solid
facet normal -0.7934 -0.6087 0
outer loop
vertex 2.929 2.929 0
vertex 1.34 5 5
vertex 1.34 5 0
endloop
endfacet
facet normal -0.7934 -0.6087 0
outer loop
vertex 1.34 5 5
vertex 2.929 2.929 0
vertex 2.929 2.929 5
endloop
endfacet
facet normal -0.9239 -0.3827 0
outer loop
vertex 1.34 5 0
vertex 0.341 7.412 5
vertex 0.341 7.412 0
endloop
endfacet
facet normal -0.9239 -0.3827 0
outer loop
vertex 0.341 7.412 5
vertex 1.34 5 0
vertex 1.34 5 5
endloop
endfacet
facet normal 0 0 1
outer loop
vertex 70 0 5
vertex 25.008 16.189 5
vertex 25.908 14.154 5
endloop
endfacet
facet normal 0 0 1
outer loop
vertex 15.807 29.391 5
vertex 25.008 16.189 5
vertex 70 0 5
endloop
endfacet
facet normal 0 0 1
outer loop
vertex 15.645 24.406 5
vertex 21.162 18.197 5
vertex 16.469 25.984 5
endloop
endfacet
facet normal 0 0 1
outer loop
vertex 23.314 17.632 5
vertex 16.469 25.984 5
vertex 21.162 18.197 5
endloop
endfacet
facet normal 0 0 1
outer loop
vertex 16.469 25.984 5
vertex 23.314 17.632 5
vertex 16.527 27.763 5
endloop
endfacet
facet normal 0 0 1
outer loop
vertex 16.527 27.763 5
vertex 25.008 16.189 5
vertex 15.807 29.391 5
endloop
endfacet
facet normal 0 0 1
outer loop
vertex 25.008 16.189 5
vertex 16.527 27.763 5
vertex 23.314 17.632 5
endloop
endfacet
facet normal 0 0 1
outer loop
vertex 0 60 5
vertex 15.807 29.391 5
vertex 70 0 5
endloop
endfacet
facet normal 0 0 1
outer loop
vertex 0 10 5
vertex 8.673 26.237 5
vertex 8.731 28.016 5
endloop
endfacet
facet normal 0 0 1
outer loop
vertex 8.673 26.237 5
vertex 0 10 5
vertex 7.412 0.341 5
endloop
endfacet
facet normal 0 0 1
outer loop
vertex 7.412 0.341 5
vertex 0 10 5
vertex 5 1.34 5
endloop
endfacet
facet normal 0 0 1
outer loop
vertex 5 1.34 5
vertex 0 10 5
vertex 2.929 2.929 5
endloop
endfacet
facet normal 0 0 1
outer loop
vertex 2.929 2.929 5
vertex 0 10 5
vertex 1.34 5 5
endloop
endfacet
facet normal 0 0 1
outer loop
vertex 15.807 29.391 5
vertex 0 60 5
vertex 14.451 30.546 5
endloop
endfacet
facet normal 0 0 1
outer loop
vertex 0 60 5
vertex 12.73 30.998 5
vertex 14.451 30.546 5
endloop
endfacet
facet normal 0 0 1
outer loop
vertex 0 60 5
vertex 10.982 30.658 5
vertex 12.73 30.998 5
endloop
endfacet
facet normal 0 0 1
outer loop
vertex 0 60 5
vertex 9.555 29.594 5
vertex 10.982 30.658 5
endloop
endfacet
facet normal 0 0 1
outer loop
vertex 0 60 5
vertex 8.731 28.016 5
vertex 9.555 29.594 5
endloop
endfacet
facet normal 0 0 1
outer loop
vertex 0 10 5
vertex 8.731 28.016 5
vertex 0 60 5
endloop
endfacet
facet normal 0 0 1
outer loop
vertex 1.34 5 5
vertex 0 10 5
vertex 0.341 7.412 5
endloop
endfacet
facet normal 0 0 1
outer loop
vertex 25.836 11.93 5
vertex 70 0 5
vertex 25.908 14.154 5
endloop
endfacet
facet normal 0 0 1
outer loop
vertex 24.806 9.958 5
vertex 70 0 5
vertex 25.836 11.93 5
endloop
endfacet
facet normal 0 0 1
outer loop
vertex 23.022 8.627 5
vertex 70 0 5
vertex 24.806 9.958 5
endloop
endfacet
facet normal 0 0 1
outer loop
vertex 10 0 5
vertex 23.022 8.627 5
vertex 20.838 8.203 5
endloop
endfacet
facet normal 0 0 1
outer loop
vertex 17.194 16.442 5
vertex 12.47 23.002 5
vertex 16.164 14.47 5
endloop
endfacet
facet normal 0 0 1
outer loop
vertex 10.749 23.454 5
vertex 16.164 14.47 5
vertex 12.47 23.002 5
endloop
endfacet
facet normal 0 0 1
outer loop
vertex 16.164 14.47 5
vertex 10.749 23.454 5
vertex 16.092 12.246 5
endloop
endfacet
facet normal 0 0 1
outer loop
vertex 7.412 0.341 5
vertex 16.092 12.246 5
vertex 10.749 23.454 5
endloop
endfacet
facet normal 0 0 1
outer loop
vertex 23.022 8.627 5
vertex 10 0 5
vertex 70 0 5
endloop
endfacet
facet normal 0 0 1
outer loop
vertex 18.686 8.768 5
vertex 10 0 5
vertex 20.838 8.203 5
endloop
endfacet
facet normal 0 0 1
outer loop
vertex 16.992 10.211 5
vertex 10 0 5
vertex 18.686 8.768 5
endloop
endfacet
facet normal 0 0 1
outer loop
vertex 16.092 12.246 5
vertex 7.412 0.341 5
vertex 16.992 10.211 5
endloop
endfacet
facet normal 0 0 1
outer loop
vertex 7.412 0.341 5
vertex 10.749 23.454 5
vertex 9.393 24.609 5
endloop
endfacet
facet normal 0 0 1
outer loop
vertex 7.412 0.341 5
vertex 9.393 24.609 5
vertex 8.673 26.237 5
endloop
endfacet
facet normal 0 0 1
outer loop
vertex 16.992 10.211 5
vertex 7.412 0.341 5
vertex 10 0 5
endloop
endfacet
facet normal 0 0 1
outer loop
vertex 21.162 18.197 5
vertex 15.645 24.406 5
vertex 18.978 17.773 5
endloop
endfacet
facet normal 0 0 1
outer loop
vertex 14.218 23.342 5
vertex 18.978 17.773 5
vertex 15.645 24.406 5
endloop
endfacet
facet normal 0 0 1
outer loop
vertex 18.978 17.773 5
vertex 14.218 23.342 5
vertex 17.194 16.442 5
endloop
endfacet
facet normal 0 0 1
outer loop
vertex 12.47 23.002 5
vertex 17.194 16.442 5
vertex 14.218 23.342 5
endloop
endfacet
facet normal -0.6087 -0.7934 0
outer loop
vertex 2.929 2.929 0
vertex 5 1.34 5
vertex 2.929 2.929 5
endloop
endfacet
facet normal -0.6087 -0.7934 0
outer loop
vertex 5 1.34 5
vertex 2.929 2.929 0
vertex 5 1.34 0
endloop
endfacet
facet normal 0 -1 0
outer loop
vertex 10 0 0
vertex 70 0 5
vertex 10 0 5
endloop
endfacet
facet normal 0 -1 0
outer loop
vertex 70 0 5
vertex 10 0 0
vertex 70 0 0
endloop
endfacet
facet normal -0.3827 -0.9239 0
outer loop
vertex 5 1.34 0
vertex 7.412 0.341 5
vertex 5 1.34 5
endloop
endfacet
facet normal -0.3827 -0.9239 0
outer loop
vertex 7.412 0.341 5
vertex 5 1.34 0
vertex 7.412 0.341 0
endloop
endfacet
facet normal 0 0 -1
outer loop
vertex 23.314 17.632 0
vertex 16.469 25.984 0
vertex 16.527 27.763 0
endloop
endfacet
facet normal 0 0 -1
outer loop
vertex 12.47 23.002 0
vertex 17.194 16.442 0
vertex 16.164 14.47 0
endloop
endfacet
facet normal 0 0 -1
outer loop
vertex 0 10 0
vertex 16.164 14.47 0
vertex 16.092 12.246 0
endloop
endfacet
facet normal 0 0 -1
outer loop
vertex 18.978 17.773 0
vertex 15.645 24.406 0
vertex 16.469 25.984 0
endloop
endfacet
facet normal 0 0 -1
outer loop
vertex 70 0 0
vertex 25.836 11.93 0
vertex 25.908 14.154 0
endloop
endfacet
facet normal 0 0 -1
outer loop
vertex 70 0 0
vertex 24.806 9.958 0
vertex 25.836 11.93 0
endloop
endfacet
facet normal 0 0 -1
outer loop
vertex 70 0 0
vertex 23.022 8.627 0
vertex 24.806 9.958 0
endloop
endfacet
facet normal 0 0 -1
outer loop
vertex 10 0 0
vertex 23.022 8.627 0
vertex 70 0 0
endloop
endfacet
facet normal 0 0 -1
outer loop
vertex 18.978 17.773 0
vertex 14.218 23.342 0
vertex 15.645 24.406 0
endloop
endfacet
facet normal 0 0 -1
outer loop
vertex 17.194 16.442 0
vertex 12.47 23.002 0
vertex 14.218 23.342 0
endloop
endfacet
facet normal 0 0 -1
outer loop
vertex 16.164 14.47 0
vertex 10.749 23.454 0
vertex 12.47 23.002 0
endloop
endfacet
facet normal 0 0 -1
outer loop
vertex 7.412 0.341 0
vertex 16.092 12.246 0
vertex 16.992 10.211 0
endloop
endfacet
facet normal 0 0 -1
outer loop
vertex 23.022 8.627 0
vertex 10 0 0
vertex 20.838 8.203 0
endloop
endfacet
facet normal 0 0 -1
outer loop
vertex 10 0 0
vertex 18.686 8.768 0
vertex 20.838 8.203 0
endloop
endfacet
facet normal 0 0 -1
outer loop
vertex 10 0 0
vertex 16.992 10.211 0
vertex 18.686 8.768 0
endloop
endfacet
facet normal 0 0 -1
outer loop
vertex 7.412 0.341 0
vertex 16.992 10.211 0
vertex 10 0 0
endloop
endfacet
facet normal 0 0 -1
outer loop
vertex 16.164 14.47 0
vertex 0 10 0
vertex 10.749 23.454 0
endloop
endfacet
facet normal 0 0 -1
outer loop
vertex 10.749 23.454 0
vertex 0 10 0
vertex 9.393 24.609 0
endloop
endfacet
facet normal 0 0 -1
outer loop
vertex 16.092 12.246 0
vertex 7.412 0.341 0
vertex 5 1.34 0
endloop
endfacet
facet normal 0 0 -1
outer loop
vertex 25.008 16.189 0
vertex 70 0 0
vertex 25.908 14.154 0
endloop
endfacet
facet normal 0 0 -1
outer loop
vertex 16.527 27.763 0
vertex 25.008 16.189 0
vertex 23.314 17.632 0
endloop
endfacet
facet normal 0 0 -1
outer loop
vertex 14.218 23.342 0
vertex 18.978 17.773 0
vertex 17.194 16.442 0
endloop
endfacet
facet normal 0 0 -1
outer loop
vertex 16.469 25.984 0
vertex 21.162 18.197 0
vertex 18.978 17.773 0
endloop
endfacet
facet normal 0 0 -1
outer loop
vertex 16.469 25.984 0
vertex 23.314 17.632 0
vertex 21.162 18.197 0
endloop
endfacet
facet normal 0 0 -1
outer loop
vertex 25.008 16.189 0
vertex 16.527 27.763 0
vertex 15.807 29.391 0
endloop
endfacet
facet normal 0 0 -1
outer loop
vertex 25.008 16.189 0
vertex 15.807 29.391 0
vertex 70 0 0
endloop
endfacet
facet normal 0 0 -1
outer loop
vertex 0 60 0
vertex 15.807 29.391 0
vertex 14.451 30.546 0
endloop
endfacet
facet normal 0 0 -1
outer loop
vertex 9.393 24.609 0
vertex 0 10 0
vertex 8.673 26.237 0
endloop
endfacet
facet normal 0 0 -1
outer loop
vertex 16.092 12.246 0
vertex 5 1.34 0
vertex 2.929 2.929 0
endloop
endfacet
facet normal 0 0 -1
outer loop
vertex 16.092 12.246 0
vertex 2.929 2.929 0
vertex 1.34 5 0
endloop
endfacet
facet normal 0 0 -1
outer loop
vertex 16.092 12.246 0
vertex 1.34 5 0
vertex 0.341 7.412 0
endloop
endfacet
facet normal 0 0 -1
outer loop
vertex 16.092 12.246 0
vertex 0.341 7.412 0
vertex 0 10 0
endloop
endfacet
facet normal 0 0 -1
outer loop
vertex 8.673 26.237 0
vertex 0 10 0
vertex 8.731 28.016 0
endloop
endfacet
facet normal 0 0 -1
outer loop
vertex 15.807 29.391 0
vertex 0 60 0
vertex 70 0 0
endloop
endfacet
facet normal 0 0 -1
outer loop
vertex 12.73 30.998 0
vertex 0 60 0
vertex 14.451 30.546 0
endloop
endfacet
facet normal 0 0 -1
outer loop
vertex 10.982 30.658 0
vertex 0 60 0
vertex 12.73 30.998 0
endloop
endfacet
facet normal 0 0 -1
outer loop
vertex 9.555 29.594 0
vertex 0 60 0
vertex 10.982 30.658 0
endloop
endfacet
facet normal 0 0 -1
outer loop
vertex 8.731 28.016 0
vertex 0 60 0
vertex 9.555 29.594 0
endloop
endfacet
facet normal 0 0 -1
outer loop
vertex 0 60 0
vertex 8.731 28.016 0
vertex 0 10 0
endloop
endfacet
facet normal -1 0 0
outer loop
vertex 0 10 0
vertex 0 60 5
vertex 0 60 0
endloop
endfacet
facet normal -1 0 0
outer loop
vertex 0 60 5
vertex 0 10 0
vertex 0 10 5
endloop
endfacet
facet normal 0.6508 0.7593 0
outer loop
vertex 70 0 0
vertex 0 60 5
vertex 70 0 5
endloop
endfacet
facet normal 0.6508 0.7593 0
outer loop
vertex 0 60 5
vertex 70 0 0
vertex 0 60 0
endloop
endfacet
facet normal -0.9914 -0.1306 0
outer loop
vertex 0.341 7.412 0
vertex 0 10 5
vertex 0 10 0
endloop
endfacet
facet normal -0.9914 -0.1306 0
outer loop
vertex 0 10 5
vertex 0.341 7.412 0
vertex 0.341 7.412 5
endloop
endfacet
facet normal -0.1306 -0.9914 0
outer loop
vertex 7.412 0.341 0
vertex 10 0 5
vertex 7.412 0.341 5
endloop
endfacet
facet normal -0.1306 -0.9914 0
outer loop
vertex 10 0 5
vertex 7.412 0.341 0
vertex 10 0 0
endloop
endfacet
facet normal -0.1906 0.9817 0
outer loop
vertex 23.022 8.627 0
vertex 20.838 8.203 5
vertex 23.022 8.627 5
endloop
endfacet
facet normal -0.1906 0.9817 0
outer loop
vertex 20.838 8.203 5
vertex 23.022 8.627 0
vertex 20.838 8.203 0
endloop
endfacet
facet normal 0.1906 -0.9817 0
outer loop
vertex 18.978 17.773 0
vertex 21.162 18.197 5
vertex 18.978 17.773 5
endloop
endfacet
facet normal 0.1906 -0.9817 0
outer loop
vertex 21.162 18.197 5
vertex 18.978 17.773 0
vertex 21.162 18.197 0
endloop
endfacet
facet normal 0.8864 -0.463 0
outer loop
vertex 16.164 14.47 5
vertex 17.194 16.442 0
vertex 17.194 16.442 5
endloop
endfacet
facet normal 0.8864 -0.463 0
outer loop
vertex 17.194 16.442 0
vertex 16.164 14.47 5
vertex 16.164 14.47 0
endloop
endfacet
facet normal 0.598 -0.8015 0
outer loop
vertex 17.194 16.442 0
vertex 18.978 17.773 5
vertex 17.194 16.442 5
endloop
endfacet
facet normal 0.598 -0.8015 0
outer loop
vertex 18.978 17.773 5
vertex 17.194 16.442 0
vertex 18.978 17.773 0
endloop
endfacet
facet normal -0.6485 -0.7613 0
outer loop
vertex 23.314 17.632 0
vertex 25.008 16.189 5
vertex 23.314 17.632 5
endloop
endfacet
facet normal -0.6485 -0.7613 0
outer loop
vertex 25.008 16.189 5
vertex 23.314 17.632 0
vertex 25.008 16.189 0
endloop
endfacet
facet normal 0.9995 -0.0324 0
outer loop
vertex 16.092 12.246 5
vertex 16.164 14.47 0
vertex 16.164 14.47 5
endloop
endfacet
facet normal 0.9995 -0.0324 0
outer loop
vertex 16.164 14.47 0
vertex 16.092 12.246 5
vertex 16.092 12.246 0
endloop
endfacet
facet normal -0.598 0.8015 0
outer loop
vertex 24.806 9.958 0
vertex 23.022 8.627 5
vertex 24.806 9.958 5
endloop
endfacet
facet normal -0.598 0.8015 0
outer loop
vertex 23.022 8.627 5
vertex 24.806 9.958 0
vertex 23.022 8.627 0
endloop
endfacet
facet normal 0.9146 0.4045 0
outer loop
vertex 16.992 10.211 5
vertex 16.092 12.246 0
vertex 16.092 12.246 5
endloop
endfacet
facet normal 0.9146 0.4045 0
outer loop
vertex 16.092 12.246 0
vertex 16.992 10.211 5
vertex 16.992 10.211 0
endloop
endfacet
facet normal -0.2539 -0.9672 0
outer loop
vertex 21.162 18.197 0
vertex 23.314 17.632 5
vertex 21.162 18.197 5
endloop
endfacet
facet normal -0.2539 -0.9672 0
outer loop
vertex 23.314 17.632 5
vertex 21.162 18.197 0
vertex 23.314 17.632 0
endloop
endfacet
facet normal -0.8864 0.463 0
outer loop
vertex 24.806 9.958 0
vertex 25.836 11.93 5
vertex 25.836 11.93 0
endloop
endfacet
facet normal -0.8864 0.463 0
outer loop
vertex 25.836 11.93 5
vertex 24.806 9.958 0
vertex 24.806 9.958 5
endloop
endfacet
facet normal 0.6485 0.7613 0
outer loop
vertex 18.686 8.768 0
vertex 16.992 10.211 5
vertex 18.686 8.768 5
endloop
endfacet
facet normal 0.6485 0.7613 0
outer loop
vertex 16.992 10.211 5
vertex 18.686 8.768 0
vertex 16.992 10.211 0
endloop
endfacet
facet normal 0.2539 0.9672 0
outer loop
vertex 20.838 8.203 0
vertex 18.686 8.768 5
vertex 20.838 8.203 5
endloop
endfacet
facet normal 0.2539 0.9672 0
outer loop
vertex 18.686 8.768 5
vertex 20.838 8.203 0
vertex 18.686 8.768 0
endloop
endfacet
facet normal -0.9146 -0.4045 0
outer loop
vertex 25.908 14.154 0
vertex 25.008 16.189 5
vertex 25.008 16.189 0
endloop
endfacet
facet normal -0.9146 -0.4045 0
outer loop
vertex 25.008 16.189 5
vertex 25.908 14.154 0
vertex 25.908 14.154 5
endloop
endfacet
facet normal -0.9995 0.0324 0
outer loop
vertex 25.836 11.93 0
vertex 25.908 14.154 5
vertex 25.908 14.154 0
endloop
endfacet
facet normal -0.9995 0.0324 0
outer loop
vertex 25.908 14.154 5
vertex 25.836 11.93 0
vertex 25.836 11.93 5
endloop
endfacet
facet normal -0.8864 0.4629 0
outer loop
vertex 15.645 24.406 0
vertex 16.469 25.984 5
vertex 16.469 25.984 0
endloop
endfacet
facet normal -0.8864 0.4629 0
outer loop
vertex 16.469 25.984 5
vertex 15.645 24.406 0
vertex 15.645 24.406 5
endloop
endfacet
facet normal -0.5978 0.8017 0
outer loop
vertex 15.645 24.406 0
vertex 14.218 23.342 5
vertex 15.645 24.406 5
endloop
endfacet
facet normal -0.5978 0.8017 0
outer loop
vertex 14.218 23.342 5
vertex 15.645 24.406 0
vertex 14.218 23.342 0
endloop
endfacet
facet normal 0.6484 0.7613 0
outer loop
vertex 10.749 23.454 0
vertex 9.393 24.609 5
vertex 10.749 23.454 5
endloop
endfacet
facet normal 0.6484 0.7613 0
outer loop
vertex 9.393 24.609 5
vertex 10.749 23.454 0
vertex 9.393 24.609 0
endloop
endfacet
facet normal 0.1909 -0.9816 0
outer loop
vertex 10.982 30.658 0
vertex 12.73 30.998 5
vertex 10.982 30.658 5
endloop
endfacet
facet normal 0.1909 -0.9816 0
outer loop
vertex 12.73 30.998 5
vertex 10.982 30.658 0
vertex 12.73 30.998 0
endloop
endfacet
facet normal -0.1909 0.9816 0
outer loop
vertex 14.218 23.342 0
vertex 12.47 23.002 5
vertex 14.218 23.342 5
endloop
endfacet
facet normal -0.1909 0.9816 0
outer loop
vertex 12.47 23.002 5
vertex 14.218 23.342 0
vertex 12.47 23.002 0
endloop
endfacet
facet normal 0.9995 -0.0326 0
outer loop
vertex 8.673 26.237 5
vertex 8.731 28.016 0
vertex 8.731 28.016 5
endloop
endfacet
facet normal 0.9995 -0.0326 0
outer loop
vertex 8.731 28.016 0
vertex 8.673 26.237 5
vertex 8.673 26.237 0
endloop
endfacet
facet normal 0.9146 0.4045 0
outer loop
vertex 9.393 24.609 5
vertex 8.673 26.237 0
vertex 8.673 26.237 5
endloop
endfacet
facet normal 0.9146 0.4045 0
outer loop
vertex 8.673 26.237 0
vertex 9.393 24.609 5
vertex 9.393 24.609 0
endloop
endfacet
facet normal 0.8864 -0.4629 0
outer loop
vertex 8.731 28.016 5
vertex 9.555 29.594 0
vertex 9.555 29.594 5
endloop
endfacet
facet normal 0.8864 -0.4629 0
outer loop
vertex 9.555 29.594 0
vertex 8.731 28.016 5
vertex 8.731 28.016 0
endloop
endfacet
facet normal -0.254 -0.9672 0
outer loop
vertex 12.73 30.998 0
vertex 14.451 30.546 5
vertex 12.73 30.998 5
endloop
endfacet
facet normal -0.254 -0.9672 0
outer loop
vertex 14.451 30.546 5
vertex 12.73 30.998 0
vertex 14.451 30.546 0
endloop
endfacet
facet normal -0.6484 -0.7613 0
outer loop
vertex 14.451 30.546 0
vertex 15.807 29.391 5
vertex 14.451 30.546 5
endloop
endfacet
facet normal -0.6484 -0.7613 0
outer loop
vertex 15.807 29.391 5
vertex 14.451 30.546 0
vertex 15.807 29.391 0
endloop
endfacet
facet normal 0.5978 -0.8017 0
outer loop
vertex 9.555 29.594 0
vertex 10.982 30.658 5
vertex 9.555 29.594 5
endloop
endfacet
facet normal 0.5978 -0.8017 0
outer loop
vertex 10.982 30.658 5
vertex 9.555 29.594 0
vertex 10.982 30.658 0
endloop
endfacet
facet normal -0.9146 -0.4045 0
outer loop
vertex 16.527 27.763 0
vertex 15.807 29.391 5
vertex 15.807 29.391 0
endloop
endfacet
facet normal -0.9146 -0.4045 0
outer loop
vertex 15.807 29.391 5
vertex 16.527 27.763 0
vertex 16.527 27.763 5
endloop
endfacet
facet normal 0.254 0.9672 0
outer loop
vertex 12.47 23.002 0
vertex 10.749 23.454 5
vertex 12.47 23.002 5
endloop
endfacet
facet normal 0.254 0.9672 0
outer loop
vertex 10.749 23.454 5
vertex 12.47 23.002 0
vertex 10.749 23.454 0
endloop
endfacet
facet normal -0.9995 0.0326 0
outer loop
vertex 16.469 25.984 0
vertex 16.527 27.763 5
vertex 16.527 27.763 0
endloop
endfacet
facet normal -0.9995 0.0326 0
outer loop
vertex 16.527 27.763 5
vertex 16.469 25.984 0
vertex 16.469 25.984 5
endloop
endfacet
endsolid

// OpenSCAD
$fn = 32;

// ----------------------------------------------------------------------
// Bracket plate: corner pad 70 x 60, fillet R10
// ----------------------------------------------------------------------

// --- parameters (mm) ---
hole_r = 4;               // bolt hole radius
plate_t = 5;              // plate thickness, Z (extrusion height)
leg_a = 70;               // base leg
leg_b = 60;               // height leg
fillet_r = 10;            // right-angle fillet radius

hole_d1 = 2 * hole_r + 2;
hole_d2 = 2 * hole_r;

profile = [[10, 0], [70, 0], [0, 60], [0, 10], [0.341, 7.412], [1.34, 5], [2.929, 2.929], [5, 1.34], [7.412, 0.341]];  // primary outline, 9 points, counter clockwise
void_1 = [[25.908, 14.154], [25.008, 16.189], [23.314, 17.632], [21.162, 18.197], [18.978, 17.773], [17.194, 16.442], [16.164, 14.47], [16.092, 12.246], [16.992, 10.211], [18.686, 8.768], [20.838, 8.203], [23.022, 8.627], [24.806, 9.958], [25.836, 11.93]];  // mount hole 1, 14 points
void_2 = [[16.527, 27.763], [15.807, 29.391], [14.451, 30.546], [12.73, 30.998], [10.982, 30.658], [9.555, 29.594], [8.731, 28.016], [8.673, 26.237], [9.393, 24.609], [10.749, 23.454], [12.47, 23.002], [14.218, 23.342], [15.645, 24.406], [16.469, 25.984]];  // mount hole 2, 14 points

// --- the one profile operation ---
difference() {
  linear_extrude(height = plate_t) polygon(points = profile);
  translate([0, 0, -1])
    linear_extrude(height = plate_t + 2) polygon(points = void_1);
  translate([0, 0, -1])
    linear_extrude(height = plate_t + 2) polygon(points = void_2);
}
